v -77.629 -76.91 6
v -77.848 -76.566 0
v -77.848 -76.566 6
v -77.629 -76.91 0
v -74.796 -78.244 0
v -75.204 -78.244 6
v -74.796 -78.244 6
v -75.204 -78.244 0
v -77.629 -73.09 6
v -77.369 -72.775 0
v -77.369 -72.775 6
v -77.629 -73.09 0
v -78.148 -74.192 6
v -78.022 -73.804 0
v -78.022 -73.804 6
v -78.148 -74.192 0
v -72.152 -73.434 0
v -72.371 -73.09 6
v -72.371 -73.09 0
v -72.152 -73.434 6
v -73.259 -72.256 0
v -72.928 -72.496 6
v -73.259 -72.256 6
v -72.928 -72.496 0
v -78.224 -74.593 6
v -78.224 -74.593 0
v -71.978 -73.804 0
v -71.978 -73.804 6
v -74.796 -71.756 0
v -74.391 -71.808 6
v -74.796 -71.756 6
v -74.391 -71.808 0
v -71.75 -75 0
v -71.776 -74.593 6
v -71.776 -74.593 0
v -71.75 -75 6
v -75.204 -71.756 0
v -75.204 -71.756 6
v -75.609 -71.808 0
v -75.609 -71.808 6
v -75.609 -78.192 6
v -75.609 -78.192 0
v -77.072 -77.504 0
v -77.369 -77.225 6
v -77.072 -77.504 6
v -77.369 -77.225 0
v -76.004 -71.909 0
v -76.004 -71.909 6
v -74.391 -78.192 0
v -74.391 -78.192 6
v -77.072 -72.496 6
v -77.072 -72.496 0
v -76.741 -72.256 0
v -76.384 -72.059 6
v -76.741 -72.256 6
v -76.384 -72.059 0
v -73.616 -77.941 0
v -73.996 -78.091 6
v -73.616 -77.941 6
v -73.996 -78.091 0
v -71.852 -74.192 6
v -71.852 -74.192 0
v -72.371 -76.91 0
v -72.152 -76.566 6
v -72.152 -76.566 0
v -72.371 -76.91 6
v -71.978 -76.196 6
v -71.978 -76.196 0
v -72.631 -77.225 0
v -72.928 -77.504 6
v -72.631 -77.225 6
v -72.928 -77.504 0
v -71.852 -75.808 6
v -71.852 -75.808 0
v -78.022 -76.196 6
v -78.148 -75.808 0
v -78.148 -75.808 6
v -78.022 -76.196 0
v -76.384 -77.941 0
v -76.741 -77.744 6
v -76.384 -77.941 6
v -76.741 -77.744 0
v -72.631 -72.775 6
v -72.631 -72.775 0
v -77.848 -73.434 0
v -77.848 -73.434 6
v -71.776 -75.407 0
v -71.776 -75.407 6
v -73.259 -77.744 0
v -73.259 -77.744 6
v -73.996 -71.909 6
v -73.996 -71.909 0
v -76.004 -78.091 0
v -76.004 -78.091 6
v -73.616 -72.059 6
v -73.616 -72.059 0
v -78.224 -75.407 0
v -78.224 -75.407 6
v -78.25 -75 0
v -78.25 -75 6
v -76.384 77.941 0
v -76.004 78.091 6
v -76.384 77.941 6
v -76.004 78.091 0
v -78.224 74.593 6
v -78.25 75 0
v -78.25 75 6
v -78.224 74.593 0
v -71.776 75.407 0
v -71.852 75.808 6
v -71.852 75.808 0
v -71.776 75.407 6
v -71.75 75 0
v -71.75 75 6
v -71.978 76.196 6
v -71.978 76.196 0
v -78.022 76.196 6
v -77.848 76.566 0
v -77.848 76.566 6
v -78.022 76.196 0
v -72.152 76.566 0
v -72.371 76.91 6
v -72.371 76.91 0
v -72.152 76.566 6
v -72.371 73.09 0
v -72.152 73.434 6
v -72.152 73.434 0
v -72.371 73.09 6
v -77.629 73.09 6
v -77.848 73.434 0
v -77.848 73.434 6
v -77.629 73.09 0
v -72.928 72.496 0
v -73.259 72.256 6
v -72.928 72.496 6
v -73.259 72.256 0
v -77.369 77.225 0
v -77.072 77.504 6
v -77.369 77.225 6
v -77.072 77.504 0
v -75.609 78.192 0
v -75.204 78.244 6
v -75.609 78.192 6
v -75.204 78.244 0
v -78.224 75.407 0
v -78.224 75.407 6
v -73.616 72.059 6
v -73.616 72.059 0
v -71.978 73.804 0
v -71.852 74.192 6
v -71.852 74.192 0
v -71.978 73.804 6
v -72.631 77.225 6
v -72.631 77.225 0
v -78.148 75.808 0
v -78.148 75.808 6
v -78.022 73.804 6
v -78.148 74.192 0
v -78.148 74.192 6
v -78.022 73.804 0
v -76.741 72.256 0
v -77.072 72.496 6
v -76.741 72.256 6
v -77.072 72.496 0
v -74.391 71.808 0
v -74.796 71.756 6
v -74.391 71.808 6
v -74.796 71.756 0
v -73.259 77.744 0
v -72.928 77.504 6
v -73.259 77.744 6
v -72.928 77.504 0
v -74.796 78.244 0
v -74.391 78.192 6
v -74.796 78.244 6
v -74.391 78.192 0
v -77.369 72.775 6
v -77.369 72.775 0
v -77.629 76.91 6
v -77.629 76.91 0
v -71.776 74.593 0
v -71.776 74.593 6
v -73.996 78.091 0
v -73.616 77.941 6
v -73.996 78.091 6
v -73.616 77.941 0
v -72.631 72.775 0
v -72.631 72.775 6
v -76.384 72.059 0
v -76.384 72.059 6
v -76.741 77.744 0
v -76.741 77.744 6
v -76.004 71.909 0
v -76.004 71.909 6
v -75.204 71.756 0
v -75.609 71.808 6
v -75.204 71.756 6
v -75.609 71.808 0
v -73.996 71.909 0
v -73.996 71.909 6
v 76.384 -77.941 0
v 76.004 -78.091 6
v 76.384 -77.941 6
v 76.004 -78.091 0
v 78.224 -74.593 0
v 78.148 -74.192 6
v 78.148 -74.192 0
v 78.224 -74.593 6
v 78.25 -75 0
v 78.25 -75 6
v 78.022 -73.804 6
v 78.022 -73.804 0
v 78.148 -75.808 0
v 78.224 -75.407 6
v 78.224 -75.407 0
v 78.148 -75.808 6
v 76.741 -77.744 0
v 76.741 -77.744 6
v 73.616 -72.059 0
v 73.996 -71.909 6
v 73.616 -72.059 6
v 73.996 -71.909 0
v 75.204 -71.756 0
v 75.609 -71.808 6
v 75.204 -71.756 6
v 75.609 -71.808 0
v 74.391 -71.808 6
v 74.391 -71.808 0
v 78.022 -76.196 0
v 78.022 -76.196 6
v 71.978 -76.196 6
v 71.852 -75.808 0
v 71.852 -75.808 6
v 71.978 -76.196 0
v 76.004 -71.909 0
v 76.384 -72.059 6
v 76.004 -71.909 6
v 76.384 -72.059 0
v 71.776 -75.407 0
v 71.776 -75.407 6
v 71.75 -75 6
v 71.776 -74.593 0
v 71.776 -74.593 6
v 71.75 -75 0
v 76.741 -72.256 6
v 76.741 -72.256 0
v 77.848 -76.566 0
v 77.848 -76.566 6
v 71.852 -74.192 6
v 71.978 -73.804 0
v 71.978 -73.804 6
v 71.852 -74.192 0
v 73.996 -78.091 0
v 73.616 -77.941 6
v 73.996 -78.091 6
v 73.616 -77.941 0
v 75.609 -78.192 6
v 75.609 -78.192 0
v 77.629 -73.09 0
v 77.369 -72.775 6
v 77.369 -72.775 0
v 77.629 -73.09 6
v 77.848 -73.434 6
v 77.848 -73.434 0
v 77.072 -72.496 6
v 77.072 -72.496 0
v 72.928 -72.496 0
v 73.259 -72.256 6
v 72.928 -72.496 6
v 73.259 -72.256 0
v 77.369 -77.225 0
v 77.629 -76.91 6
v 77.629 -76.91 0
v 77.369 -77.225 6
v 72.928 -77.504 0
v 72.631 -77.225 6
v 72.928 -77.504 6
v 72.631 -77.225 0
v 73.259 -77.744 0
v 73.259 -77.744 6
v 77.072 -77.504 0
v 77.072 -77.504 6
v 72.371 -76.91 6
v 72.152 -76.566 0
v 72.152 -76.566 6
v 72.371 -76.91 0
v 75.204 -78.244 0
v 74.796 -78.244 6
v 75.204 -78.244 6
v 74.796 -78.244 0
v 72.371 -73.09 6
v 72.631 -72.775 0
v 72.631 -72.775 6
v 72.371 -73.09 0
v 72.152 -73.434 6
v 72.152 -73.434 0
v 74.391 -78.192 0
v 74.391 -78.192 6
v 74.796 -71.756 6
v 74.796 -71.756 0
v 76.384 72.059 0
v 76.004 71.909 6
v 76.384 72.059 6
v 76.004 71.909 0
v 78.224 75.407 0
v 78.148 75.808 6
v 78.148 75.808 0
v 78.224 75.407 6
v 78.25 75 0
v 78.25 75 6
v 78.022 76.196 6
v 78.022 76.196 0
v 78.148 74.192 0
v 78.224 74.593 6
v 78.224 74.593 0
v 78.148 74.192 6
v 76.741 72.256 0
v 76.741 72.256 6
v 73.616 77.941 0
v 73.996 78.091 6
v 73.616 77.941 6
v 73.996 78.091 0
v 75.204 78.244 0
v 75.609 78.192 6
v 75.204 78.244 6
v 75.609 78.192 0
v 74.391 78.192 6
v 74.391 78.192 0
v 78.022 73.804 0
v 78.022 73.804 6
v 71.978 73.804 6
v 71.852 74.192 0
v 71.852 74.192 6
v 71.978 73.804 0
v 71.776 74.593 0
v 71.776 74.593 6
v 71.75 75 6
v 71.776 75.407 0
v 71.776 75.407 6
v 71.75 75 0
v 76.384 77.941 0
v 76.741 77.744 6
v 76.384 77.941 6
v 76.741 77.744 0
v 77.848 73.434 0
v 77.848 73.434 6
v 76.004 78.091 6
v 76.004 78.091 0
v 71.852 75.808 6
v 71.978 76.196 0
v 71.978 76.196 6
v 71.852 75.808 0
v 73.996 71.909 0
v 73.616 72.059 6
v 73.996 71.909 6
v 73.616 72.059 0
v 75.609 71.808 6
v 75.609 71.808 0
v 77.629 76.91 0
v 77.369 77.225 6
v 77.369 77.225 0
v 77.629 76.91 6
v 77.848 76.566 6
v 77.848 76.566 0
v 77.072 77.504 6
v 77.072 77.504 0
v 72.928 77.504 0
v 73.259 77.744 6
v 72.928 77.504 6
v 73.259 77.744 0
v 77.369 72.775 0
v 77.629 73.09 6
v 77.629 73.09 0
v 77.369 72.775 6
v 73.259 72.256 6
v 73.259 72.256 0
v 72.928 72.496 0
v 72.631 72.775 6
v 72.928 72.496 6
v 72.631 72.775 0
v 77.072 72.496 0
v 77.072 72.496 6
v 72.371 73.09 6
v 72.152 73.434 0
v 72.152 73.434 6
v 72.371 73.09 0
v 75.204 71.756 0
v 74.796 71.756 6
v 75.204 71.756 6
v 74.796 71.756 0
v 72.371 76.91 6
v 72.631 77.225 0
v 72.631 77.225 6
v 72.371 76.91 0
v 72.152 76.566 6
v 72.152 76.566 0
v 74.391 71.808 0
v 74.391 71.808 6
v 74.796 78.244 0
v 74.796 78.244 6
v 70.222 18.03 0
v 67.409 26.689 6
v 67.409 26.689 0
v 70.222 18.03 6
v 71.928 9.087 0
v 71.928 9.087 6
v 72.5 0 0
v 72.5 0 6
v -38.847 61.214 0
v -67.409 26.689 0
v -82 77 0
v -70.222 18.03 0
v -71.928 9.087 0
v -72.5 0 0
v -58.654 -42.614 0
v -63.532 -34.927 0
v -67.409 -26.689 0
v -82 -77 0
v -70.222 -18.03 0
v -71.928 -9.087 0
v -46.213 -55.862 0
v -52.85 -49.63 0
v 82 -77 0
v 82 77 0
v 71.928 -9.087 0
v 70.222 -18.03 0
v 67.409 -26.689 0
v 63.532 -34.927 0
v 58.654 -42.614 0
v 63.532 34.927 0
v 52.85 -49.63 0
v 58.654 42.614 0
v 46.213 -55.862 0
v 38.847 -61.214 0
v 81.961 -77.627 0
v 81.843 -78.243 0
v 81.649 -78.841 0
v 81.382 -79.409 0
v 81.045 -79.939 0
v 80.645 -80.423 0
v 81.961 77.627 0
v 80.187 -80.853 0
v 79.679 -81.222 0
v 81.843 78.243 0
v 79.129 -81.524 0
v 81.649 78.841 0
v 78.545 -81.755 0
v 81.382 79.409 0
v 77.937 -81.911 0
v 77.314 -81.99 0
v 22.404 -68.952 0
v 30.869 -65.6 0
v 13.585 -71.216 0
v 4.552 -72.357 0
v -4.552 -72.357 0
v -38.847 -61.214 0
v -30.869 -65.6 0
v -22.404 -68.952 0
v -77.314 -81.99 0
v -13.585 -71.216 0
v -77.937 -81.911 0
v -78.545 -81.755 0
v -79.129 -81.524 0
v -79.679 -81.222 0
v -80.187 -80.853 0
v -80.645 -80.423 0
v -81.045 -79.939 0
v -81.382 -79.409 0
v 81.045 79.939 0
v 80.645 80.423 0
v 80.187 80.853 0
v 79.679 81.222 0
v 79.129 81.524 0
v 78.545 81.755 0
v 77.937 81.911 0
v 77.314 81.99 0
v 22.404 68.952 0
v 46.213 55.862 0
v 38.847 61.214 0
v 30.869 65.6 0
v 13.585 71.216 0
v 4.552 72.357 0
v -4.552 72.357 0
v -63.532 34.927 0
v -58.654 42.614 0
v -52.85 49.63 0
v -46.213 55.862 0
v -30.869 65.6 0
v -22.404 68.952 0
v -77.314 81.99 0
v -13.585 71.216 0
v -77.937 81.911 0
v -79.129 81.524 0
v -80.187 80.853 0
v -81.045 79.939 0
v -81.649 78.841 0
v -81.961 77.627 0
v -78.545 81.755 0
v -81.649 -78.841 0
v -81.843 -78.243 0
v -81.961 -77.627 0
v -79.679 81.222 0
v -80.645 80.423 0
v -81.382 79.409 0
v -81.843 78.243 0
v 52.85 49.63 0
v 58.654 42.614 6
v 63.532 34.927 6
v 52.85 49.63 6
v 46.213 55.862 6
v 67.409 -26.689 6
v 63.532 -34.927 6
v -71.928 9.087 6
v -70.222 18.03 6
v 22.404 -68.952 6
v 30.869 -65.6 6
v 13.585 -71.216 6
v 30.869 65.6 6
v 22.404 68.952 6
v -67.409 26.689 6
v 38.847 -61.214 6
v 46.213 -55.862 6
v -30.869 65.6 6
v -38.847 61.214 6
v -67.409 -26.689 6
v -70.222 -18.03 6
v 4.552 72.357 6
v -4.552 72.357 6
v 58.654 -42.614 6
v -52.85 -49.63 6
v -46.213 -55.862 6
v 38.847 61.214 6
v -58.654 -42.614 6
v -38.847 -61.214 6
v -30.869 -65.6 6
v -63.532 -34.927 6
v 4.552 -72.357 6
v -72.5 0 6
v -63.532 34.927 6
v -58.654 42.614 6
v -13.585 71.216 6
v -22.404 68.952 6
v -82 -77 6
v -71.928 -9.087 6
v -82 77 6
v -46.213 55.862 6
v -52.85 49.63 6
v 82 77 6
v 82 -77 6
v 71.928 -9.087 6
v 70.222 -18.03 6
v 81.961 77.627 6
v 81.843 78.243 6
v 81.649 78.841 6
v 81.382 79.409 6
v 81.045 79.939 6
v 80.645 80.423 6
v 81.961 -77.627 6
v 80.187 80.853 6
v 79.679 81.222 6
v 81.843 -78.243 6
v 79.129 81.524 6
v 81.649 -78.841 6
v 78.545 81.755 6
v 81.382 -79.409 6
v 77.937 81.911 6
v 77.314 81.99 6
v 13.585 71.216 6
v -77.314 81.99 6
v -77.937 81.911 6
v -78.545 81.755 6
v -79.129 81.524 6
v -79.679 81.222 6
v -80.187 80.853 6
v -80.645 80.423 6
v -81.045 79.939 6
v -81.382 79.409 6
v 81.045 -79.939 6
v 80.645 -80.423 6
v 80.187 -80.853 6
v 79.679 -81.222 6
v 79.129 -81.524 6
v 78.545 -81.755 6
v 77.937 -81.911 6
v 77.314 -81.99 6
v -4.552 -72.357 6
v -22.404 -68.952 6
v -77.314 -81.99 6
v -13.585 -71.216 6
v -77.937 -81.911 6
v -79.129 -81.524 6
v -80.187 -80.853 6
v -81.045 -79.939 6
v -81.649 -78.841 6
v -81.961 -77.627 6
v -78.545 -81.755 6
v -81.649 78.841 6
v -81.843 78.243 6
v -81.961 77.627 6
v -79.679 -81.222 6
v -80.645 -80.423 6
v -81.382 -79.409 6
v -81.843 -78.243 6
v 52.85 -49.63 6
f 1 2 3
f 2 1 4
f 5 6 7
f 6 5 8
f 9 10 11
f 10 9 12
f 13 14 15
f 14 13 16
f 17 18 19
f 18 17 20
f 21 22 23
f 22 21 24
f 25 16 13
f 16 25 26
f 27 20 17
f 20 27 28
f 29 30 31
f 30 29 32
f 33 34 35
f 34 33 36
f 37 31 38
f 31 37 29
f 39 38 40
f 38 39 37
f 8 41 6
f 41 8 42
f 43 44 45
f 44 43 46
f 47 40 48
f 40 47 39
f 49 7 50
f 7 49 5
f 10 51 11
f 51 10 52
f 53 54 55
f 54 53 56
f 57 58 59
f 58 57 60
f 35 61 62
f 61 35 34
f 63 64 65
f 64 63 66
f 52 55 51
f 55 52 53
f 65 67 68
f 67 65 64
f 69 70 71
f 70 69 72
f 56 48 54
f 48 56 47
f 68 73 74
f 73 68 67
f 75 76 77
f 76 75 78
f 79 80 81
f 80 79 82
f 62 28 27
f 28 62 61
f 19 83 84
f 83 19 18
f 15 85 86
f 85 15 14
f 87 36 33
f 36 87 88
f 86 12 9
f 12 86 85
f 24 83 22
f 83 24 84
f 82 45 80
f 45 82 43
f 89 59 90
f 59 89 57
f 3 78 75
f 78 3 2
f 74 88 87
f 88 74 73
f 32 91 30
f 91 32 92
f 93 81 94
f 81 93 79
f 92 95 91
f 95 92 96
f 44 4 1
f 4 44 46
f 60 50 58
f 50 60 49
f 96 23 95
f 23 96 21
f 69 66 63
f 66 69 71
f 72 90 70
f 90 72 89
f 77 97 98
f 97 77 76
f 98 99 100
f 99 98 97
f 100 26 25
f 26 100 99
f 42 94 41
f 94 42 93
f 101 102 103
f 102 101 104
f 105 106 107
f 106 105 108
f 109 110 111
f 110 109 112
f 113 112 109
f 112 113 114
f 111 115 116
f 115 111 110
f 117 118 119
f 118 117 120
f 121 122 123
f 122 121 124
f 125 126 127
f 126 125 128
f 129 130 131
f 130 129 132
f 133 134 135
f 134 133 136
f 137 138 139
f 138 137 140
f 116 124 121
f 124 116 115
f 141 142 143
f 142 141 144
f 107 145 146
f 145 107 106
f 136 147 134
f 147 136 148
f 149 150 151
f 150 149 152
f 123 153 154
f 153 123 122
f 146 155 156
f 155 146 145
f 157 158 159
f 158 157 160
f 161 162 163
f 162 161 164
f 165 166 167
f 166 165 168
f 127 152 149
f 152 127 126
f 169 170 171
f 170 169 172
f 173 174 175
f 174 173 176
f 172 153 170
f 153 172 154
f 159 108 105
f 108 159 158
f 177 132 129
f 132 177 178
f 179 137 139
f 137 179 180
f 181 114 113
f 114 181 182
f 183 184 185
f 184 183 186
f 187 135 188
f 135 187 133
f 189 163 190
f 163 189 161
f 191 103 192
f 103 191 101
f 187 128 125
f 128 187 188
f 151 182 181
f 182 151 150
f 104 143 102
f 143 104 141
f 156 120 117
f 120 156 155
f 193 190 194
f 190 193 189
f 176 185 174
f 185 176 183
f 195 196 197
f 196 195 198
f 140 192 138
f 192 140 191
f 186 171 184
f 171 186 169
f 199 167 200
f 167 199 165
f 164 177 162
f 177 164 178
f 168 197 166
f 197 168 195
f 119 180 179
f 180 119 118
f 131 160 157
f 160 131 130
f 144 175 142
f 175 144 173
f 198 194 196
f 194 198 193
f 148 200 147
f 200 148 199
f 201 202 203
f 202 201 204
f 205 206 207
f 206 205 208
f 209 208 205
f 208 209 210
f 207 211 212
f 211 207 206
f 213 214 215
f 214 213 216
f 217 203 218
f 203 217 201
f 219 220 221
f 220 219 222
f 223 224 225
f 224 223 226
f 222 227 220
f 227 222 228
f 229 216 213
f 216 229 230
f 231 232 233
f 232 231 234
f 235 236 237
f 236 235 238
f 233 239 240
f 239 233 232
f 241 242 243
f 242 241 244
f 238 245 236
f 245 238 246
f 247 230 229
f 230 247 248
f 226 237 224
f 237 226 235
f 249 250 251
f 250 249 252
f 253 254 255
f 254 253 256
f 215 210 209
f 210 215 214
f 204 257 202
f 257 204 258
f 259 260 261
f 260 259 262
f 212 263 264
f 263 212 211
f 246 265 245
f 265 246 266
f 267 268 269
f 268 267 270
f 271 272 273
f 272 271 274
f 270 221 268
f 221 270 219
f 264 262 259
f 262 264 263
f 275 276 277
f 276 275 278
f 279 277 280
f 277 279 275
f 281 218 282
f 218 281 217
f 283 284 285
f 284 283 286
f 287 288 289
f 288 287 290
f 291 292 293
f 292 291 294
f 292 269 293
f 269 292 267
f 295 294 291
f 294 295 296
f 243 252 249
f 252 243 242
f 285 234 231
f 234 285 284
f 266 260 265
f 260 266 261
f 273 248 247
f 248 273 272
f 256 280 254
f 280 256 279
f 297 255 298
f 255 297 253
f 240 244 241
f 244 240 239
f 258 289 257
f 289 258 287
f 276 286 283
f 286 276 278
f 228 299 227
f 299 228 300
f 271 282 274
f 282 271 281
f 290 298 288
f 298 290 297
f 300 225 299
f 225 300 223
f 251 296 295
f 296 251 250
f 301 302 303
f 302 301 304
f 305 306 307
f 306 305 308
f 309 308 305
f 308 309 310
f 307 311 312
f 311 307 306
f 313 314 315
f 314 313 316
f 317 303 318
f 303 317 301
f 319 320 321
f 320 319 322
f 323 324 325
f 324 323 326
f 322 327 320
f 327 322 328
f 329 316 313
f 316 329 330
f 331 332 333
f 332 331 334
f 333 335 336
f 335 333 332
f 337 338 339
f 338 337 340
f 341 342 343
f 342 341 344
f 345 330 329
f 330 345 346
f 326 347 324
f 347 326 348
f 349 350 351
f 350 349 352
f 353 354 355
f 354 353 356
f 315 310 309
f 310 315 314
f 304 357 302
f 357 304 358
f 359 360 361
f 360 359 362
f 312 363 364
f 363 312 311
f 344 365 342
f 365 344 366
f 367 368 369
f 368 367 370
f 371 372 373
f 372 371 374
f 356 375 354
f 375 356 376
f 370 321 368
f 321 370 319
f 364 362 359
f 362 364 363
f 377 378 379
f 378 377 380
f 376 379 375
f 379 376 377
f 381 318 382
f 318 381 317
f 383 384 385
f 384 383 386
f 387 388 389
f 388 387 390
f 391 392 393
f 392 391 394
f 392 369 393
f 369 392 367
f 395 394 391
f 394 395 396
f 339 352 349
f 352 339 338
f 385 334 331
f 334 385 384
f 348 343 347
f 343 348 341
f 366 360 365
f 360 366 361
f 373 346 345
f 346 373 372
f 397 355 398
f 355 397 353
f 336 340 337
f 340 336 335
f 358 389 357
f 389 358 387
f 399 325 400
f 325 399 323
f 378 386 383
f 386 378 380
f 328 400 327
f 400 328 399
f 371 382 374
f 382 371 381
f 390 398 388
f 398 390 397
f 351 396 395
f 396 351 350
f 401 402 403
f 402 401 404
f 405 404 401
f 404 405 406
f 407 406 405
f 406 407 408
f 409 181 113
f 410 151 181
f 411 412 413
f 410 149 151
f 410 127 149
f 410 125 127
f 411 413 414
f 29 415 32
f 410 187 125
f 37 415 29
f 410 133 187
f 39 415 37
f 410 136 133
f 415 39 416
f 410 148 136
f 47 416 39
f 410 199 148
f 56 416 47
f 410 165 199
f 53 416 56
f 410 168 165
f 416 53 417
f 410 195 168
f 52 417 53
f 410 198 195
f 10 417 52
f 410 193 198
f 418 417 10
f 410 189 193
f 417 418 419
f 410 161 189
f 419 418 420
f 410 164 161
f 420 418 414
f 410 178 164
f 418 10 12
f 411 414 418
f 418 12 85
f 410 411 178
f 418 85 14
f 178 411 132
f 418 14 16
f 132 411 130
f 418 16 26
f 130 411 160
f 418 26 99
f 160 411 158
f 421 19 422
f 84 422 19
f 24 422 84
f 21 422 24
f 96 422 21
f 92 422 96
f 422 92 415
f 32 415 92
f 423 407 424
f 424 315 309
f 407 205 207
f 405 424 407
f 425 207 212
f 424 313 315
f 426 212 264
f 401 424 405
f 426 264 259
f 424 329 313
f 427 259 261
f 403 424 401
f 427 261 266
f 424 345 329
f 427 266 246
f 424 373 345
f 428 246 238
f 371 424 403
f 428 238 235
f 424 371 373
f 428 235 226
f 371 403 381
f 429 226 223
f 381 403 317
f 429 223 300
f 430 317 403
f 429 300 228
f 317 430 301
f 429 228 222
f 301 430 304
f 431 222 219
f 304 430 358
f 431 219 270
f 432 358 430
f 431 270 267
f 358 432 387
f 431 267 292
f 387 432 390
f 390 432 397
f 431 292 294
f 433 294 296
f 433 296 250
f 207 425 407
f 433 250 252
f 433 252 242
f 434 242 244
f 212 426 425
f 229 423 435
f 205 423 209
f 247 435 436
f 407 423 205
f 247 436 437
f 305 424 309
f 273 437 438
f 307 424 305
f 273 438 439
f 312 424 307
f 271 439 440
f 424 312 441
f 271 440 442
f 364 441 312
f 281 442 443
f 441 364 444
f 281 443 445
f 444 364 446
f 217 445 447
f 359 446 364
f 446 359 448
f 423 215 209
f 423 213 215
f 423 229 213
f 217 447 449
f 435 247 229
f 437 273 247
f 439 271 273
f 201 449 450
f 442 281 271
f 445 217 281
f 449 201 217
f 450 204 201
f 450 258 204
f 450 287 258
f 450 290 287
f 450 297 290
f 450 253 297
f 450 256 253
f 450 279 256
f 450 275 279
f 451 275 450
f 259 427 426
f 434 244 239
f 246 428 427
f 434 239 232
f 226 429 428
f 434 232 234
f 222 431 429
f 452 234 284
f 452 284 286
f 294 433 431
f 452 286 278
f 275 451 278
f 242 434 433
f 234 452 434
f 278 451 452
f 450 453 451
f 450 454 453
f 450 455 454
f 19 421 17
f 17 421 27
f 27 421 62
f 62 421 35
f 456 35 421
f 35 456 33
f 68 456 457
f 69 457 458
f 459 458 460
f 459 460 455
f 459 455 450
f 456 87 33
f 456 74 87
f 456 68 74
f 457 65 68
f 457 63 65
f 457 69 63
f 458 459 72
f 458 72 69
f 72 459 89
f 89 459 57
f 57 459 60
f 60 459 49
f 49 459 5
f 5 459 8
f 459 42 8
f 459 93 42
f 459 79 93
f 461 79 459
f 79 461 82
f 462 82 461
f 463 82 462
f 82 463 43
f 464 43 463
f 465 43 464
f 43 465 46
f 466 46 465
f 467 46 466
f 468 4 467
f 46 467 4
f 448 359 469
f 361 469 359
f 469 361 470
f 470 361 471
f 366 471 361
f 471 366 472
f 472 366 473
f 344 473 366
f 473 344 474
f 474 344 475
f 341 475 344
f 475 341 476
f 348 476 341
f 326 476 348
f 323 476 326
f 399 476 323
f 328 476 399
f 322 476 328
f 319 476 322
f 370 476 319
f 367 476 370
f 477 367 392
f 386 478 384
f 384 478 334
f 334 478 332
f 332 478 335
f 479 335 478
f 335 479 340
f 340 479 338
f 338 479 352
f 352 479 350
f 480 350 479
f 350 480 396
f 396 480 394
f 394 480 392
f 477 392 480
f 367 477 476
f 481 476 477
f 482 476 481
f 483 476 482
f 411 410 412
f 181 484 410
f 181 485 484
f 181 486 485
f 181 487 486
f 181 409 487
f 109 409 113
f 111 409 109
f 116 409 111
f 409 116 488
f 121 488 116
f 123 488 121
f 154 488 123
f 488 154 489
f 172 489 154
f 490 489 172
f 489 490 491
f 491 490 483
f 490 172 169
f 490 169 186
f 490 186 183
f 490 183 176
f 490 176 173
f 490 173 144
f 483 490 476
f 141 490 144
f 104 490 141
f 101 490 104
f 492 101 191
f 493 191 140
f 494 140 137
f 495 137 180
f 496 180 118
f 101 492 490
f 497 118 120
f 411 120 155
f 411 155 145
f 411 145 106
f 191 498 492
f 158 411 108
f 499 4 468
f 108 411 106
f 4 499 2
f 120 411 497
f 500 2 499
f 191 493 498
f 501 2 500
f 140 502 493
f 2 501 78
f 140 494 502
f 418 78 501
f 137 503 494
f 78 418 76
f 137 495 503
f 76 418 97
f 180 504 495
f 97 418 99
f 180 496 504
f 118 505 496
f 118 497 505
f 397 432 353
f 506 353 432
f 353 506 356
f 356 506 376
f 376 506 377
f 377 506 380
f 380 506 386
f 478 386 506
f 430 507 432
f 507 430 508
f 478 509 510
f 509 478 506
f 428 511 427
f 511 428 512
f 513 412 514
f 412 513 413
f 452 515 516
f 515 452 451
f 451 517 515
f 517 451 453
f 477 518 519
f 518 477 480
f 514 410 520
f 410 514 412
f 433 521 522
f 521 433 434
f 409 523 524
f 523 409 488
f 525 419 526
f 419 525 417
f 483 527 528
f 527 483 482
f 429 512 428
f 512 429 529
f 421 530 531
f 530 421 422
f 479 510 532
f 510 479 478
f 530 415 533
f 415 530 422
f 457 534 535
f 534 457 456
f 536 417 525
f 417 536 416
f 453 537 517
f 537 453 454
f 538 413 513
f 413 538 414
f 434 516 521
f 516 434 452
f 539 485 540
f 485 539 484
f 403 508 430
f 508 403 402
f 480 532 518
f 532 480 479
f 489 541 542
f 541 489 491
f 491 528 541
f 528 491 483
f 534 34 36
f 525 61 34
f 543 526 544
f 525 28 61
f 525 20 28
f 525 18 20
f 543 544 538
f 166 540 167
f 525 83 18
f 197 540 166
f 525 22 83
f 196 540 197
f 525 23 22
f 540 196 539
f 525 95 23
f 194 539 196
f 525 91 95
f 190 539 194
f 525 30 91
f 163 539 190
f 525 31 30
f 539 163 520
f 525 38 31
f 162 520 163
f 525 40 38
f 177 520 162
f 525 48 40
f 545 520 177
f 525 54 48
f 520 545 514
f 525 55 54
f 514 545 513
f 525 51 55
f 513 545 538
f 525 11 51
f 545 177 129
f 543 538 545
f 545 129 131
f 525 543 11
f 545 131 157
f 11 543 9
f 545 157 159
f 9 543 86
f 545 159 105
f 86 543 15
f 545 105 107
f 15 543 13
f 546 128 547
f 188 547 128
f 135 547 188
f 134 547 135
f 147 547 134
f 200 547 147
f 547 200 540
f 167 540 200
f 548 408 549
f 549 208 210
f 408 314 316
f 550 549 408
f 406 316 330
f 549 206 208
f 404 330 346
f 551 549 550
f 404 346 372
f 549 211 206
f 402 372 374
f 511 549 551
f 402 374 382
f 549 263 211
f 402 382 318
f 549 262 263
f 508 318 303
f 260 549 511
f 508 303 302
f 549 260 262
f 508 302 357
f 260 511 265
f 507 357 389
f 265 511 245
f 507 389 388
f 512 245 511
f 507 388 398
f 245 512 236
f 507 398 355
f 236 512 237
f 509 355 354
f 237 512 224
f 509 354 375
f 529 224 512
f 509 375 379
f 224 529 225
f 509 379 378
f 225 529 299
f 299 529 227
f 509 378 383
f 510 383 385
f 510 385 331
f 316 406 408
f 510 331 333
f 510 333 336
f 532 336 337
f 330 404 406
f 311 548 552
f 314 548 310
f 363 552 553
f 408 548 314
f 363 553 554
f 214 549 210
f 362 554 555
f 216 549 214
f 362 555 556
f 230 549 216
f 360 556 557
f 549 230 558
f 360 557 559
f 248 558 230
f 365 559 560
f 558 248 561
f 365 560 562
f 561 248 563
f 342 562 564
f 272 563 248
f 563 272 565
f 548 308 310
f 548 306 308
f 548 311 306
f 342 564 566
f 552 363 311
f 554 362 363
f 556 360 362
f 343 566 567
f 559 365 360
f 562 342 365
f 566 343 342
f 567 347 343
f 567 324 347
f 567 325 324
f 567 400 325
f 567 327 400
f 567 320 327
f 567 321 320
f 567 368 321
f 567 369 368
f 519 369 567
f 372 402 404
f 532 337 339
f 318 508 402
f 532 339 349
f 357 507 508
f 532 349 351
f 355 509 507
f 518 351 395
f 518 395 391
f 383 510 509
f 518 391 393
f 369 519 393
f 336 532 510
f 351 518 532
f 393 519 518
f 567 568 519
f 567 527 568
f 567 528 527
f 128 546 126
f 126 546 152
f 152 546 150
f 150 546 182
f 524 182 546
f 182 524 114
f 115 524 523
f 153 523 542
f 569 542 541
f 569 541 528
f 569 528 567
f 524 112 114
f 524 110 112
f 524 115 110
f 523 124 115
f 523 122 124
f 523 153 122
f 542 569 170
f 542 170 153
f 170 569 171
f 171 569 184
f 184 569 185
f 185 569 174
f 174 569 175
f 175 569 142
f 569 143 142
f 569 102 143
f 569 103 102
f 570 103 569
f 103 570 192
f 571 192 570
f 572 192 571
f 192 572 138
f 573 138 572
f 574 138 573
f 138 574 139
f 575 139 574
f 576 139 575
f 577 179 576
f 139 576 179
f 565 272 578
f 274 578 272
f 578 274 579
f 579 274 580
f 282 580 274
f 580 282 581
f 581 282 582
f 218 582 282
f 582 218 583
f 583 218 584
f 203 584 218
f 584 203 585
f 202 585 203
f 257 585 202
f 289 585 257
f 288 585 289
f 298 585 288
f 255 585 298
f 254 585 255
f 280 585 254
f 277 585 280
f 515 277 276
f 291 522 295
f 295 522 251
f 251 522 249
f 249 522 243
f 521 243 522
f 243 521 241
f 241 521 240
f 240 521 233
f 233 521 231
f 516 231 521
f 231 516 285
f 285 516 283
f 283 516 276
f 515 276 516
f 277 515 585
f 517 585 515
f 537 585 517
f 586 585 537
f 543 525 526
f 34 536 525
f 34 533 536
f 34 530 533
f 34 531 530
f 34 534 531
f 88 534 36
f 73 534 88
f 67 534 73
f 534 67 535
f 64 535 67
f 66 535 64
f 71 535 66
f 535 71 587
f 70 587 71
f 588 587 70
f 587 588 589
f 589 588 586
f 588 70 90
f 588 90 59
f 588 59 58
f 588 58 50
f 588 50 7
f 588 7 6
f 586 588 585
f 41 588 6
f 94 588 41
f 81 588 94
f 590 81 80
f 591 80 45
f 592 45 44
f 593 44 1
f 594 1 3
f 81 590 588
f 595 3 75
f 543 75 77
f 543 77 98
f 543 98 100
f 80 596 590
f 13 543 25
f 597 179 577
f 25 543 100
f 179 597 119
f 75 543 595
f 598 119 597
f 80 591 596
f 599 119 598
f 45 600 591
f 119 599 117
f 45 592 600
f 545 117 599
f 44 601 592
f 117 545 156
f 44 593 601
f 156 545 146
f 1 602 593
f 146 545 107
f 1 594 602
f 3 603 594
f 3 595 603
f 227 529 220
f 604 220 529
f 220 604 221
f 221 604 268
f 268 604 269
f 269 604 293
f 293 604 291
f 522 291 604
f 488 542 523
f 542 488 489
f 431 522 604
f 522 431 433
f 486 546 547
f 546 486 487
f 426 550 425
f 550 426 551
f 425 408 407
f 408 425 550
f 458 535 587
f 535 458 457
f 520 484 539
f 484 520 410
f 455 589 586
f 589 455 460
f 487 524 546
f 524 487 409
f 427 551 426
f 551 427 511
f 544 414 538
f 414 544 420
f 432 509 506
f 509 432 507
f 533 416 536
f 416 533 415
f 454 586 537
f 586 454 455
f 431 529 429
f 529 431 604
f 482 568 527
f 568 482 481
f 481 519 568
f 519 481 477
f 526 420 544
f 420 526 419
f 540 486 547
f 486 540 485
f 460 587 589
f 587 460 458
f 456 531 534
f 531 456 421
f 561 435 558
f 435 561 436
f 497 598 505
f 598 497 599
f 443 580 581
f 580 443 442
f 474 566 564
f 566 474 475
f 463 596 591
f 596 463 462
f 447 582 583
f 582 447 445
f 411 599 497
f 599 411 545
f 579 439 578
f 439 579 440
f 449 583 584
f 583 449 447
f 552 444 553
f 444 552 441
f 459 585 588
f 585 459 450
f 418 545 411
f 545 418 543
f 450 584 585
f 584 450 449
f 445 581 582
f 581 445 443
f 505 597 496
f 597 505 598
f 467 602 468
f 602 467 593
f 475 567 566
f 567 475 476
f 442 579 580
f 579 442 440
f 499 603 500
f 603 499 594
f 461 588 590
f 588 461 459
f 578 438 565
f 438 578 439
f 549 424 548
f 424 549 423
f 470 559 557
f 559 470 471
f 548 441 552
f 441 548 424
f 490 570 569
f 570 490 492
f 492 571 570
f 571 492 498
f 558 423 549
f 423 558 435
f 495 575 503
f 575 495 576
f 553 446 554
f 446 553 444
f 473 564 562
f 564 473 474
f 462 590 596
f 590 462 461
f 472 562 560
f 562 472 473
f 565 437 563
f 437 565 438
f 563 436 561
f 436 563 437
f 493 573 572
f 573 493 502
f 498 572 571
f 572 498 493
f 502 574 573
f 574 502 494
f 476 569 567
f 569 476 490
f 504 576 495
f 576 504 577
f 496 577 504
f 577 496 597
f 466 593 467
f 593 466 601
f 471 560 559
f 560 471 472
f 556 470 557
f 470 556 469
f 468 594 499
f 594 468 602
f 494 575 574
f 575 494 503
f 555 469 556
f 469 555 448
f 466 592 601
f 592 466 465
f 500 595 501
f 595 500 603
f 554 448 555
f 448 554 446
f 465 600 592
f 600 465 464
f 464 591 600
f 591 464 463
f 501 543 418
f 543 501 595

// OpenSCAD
$fn = 50;


difference() {
	union() {
		hull() {
			translate(v = [-77.0000000000, 77.0000000000, 0]) {
				cylinder(h = 6, r = 5);
			}
			translate(v = [77.0000000000, 77.0000000000, 0]) {
				cylinder(h = 6, r = 5);
			}
			translate(v = [-77.0000000000, -77.0000000000, 0]) {
				cylinder(h = 6, r = 5);
			}
			translate(v = [77.0000000000, -77.0000000000, 0]) {
				cylinder(h = 6, r = 5);
			}
		}
	}
	union() {
		#translate(v = [-75.0000000000, -75.0000000000, -100.0000000000]) {
			cylinder(h = 200, r = 3.2500000000);
		}
		#translate(v = [-75.0000000000, 75.0000000000, -100.0000000000]) {
			cylinder(h = 200, r = 3.2500000000);
		}
		#translate(v = [75.0000000000, -75.0000000000, -100.0000000000]) {
			cylinder(h = 200, r = 3.2500000000);
		}
		#translate(v = [75.0000000000, 75.0000000000, -100.0000000000]) {
			cylinder(h = 200, r = 3.2500000000);
		}
		#cylinder(h = 6, r = 72.5000000000);
	}
}
